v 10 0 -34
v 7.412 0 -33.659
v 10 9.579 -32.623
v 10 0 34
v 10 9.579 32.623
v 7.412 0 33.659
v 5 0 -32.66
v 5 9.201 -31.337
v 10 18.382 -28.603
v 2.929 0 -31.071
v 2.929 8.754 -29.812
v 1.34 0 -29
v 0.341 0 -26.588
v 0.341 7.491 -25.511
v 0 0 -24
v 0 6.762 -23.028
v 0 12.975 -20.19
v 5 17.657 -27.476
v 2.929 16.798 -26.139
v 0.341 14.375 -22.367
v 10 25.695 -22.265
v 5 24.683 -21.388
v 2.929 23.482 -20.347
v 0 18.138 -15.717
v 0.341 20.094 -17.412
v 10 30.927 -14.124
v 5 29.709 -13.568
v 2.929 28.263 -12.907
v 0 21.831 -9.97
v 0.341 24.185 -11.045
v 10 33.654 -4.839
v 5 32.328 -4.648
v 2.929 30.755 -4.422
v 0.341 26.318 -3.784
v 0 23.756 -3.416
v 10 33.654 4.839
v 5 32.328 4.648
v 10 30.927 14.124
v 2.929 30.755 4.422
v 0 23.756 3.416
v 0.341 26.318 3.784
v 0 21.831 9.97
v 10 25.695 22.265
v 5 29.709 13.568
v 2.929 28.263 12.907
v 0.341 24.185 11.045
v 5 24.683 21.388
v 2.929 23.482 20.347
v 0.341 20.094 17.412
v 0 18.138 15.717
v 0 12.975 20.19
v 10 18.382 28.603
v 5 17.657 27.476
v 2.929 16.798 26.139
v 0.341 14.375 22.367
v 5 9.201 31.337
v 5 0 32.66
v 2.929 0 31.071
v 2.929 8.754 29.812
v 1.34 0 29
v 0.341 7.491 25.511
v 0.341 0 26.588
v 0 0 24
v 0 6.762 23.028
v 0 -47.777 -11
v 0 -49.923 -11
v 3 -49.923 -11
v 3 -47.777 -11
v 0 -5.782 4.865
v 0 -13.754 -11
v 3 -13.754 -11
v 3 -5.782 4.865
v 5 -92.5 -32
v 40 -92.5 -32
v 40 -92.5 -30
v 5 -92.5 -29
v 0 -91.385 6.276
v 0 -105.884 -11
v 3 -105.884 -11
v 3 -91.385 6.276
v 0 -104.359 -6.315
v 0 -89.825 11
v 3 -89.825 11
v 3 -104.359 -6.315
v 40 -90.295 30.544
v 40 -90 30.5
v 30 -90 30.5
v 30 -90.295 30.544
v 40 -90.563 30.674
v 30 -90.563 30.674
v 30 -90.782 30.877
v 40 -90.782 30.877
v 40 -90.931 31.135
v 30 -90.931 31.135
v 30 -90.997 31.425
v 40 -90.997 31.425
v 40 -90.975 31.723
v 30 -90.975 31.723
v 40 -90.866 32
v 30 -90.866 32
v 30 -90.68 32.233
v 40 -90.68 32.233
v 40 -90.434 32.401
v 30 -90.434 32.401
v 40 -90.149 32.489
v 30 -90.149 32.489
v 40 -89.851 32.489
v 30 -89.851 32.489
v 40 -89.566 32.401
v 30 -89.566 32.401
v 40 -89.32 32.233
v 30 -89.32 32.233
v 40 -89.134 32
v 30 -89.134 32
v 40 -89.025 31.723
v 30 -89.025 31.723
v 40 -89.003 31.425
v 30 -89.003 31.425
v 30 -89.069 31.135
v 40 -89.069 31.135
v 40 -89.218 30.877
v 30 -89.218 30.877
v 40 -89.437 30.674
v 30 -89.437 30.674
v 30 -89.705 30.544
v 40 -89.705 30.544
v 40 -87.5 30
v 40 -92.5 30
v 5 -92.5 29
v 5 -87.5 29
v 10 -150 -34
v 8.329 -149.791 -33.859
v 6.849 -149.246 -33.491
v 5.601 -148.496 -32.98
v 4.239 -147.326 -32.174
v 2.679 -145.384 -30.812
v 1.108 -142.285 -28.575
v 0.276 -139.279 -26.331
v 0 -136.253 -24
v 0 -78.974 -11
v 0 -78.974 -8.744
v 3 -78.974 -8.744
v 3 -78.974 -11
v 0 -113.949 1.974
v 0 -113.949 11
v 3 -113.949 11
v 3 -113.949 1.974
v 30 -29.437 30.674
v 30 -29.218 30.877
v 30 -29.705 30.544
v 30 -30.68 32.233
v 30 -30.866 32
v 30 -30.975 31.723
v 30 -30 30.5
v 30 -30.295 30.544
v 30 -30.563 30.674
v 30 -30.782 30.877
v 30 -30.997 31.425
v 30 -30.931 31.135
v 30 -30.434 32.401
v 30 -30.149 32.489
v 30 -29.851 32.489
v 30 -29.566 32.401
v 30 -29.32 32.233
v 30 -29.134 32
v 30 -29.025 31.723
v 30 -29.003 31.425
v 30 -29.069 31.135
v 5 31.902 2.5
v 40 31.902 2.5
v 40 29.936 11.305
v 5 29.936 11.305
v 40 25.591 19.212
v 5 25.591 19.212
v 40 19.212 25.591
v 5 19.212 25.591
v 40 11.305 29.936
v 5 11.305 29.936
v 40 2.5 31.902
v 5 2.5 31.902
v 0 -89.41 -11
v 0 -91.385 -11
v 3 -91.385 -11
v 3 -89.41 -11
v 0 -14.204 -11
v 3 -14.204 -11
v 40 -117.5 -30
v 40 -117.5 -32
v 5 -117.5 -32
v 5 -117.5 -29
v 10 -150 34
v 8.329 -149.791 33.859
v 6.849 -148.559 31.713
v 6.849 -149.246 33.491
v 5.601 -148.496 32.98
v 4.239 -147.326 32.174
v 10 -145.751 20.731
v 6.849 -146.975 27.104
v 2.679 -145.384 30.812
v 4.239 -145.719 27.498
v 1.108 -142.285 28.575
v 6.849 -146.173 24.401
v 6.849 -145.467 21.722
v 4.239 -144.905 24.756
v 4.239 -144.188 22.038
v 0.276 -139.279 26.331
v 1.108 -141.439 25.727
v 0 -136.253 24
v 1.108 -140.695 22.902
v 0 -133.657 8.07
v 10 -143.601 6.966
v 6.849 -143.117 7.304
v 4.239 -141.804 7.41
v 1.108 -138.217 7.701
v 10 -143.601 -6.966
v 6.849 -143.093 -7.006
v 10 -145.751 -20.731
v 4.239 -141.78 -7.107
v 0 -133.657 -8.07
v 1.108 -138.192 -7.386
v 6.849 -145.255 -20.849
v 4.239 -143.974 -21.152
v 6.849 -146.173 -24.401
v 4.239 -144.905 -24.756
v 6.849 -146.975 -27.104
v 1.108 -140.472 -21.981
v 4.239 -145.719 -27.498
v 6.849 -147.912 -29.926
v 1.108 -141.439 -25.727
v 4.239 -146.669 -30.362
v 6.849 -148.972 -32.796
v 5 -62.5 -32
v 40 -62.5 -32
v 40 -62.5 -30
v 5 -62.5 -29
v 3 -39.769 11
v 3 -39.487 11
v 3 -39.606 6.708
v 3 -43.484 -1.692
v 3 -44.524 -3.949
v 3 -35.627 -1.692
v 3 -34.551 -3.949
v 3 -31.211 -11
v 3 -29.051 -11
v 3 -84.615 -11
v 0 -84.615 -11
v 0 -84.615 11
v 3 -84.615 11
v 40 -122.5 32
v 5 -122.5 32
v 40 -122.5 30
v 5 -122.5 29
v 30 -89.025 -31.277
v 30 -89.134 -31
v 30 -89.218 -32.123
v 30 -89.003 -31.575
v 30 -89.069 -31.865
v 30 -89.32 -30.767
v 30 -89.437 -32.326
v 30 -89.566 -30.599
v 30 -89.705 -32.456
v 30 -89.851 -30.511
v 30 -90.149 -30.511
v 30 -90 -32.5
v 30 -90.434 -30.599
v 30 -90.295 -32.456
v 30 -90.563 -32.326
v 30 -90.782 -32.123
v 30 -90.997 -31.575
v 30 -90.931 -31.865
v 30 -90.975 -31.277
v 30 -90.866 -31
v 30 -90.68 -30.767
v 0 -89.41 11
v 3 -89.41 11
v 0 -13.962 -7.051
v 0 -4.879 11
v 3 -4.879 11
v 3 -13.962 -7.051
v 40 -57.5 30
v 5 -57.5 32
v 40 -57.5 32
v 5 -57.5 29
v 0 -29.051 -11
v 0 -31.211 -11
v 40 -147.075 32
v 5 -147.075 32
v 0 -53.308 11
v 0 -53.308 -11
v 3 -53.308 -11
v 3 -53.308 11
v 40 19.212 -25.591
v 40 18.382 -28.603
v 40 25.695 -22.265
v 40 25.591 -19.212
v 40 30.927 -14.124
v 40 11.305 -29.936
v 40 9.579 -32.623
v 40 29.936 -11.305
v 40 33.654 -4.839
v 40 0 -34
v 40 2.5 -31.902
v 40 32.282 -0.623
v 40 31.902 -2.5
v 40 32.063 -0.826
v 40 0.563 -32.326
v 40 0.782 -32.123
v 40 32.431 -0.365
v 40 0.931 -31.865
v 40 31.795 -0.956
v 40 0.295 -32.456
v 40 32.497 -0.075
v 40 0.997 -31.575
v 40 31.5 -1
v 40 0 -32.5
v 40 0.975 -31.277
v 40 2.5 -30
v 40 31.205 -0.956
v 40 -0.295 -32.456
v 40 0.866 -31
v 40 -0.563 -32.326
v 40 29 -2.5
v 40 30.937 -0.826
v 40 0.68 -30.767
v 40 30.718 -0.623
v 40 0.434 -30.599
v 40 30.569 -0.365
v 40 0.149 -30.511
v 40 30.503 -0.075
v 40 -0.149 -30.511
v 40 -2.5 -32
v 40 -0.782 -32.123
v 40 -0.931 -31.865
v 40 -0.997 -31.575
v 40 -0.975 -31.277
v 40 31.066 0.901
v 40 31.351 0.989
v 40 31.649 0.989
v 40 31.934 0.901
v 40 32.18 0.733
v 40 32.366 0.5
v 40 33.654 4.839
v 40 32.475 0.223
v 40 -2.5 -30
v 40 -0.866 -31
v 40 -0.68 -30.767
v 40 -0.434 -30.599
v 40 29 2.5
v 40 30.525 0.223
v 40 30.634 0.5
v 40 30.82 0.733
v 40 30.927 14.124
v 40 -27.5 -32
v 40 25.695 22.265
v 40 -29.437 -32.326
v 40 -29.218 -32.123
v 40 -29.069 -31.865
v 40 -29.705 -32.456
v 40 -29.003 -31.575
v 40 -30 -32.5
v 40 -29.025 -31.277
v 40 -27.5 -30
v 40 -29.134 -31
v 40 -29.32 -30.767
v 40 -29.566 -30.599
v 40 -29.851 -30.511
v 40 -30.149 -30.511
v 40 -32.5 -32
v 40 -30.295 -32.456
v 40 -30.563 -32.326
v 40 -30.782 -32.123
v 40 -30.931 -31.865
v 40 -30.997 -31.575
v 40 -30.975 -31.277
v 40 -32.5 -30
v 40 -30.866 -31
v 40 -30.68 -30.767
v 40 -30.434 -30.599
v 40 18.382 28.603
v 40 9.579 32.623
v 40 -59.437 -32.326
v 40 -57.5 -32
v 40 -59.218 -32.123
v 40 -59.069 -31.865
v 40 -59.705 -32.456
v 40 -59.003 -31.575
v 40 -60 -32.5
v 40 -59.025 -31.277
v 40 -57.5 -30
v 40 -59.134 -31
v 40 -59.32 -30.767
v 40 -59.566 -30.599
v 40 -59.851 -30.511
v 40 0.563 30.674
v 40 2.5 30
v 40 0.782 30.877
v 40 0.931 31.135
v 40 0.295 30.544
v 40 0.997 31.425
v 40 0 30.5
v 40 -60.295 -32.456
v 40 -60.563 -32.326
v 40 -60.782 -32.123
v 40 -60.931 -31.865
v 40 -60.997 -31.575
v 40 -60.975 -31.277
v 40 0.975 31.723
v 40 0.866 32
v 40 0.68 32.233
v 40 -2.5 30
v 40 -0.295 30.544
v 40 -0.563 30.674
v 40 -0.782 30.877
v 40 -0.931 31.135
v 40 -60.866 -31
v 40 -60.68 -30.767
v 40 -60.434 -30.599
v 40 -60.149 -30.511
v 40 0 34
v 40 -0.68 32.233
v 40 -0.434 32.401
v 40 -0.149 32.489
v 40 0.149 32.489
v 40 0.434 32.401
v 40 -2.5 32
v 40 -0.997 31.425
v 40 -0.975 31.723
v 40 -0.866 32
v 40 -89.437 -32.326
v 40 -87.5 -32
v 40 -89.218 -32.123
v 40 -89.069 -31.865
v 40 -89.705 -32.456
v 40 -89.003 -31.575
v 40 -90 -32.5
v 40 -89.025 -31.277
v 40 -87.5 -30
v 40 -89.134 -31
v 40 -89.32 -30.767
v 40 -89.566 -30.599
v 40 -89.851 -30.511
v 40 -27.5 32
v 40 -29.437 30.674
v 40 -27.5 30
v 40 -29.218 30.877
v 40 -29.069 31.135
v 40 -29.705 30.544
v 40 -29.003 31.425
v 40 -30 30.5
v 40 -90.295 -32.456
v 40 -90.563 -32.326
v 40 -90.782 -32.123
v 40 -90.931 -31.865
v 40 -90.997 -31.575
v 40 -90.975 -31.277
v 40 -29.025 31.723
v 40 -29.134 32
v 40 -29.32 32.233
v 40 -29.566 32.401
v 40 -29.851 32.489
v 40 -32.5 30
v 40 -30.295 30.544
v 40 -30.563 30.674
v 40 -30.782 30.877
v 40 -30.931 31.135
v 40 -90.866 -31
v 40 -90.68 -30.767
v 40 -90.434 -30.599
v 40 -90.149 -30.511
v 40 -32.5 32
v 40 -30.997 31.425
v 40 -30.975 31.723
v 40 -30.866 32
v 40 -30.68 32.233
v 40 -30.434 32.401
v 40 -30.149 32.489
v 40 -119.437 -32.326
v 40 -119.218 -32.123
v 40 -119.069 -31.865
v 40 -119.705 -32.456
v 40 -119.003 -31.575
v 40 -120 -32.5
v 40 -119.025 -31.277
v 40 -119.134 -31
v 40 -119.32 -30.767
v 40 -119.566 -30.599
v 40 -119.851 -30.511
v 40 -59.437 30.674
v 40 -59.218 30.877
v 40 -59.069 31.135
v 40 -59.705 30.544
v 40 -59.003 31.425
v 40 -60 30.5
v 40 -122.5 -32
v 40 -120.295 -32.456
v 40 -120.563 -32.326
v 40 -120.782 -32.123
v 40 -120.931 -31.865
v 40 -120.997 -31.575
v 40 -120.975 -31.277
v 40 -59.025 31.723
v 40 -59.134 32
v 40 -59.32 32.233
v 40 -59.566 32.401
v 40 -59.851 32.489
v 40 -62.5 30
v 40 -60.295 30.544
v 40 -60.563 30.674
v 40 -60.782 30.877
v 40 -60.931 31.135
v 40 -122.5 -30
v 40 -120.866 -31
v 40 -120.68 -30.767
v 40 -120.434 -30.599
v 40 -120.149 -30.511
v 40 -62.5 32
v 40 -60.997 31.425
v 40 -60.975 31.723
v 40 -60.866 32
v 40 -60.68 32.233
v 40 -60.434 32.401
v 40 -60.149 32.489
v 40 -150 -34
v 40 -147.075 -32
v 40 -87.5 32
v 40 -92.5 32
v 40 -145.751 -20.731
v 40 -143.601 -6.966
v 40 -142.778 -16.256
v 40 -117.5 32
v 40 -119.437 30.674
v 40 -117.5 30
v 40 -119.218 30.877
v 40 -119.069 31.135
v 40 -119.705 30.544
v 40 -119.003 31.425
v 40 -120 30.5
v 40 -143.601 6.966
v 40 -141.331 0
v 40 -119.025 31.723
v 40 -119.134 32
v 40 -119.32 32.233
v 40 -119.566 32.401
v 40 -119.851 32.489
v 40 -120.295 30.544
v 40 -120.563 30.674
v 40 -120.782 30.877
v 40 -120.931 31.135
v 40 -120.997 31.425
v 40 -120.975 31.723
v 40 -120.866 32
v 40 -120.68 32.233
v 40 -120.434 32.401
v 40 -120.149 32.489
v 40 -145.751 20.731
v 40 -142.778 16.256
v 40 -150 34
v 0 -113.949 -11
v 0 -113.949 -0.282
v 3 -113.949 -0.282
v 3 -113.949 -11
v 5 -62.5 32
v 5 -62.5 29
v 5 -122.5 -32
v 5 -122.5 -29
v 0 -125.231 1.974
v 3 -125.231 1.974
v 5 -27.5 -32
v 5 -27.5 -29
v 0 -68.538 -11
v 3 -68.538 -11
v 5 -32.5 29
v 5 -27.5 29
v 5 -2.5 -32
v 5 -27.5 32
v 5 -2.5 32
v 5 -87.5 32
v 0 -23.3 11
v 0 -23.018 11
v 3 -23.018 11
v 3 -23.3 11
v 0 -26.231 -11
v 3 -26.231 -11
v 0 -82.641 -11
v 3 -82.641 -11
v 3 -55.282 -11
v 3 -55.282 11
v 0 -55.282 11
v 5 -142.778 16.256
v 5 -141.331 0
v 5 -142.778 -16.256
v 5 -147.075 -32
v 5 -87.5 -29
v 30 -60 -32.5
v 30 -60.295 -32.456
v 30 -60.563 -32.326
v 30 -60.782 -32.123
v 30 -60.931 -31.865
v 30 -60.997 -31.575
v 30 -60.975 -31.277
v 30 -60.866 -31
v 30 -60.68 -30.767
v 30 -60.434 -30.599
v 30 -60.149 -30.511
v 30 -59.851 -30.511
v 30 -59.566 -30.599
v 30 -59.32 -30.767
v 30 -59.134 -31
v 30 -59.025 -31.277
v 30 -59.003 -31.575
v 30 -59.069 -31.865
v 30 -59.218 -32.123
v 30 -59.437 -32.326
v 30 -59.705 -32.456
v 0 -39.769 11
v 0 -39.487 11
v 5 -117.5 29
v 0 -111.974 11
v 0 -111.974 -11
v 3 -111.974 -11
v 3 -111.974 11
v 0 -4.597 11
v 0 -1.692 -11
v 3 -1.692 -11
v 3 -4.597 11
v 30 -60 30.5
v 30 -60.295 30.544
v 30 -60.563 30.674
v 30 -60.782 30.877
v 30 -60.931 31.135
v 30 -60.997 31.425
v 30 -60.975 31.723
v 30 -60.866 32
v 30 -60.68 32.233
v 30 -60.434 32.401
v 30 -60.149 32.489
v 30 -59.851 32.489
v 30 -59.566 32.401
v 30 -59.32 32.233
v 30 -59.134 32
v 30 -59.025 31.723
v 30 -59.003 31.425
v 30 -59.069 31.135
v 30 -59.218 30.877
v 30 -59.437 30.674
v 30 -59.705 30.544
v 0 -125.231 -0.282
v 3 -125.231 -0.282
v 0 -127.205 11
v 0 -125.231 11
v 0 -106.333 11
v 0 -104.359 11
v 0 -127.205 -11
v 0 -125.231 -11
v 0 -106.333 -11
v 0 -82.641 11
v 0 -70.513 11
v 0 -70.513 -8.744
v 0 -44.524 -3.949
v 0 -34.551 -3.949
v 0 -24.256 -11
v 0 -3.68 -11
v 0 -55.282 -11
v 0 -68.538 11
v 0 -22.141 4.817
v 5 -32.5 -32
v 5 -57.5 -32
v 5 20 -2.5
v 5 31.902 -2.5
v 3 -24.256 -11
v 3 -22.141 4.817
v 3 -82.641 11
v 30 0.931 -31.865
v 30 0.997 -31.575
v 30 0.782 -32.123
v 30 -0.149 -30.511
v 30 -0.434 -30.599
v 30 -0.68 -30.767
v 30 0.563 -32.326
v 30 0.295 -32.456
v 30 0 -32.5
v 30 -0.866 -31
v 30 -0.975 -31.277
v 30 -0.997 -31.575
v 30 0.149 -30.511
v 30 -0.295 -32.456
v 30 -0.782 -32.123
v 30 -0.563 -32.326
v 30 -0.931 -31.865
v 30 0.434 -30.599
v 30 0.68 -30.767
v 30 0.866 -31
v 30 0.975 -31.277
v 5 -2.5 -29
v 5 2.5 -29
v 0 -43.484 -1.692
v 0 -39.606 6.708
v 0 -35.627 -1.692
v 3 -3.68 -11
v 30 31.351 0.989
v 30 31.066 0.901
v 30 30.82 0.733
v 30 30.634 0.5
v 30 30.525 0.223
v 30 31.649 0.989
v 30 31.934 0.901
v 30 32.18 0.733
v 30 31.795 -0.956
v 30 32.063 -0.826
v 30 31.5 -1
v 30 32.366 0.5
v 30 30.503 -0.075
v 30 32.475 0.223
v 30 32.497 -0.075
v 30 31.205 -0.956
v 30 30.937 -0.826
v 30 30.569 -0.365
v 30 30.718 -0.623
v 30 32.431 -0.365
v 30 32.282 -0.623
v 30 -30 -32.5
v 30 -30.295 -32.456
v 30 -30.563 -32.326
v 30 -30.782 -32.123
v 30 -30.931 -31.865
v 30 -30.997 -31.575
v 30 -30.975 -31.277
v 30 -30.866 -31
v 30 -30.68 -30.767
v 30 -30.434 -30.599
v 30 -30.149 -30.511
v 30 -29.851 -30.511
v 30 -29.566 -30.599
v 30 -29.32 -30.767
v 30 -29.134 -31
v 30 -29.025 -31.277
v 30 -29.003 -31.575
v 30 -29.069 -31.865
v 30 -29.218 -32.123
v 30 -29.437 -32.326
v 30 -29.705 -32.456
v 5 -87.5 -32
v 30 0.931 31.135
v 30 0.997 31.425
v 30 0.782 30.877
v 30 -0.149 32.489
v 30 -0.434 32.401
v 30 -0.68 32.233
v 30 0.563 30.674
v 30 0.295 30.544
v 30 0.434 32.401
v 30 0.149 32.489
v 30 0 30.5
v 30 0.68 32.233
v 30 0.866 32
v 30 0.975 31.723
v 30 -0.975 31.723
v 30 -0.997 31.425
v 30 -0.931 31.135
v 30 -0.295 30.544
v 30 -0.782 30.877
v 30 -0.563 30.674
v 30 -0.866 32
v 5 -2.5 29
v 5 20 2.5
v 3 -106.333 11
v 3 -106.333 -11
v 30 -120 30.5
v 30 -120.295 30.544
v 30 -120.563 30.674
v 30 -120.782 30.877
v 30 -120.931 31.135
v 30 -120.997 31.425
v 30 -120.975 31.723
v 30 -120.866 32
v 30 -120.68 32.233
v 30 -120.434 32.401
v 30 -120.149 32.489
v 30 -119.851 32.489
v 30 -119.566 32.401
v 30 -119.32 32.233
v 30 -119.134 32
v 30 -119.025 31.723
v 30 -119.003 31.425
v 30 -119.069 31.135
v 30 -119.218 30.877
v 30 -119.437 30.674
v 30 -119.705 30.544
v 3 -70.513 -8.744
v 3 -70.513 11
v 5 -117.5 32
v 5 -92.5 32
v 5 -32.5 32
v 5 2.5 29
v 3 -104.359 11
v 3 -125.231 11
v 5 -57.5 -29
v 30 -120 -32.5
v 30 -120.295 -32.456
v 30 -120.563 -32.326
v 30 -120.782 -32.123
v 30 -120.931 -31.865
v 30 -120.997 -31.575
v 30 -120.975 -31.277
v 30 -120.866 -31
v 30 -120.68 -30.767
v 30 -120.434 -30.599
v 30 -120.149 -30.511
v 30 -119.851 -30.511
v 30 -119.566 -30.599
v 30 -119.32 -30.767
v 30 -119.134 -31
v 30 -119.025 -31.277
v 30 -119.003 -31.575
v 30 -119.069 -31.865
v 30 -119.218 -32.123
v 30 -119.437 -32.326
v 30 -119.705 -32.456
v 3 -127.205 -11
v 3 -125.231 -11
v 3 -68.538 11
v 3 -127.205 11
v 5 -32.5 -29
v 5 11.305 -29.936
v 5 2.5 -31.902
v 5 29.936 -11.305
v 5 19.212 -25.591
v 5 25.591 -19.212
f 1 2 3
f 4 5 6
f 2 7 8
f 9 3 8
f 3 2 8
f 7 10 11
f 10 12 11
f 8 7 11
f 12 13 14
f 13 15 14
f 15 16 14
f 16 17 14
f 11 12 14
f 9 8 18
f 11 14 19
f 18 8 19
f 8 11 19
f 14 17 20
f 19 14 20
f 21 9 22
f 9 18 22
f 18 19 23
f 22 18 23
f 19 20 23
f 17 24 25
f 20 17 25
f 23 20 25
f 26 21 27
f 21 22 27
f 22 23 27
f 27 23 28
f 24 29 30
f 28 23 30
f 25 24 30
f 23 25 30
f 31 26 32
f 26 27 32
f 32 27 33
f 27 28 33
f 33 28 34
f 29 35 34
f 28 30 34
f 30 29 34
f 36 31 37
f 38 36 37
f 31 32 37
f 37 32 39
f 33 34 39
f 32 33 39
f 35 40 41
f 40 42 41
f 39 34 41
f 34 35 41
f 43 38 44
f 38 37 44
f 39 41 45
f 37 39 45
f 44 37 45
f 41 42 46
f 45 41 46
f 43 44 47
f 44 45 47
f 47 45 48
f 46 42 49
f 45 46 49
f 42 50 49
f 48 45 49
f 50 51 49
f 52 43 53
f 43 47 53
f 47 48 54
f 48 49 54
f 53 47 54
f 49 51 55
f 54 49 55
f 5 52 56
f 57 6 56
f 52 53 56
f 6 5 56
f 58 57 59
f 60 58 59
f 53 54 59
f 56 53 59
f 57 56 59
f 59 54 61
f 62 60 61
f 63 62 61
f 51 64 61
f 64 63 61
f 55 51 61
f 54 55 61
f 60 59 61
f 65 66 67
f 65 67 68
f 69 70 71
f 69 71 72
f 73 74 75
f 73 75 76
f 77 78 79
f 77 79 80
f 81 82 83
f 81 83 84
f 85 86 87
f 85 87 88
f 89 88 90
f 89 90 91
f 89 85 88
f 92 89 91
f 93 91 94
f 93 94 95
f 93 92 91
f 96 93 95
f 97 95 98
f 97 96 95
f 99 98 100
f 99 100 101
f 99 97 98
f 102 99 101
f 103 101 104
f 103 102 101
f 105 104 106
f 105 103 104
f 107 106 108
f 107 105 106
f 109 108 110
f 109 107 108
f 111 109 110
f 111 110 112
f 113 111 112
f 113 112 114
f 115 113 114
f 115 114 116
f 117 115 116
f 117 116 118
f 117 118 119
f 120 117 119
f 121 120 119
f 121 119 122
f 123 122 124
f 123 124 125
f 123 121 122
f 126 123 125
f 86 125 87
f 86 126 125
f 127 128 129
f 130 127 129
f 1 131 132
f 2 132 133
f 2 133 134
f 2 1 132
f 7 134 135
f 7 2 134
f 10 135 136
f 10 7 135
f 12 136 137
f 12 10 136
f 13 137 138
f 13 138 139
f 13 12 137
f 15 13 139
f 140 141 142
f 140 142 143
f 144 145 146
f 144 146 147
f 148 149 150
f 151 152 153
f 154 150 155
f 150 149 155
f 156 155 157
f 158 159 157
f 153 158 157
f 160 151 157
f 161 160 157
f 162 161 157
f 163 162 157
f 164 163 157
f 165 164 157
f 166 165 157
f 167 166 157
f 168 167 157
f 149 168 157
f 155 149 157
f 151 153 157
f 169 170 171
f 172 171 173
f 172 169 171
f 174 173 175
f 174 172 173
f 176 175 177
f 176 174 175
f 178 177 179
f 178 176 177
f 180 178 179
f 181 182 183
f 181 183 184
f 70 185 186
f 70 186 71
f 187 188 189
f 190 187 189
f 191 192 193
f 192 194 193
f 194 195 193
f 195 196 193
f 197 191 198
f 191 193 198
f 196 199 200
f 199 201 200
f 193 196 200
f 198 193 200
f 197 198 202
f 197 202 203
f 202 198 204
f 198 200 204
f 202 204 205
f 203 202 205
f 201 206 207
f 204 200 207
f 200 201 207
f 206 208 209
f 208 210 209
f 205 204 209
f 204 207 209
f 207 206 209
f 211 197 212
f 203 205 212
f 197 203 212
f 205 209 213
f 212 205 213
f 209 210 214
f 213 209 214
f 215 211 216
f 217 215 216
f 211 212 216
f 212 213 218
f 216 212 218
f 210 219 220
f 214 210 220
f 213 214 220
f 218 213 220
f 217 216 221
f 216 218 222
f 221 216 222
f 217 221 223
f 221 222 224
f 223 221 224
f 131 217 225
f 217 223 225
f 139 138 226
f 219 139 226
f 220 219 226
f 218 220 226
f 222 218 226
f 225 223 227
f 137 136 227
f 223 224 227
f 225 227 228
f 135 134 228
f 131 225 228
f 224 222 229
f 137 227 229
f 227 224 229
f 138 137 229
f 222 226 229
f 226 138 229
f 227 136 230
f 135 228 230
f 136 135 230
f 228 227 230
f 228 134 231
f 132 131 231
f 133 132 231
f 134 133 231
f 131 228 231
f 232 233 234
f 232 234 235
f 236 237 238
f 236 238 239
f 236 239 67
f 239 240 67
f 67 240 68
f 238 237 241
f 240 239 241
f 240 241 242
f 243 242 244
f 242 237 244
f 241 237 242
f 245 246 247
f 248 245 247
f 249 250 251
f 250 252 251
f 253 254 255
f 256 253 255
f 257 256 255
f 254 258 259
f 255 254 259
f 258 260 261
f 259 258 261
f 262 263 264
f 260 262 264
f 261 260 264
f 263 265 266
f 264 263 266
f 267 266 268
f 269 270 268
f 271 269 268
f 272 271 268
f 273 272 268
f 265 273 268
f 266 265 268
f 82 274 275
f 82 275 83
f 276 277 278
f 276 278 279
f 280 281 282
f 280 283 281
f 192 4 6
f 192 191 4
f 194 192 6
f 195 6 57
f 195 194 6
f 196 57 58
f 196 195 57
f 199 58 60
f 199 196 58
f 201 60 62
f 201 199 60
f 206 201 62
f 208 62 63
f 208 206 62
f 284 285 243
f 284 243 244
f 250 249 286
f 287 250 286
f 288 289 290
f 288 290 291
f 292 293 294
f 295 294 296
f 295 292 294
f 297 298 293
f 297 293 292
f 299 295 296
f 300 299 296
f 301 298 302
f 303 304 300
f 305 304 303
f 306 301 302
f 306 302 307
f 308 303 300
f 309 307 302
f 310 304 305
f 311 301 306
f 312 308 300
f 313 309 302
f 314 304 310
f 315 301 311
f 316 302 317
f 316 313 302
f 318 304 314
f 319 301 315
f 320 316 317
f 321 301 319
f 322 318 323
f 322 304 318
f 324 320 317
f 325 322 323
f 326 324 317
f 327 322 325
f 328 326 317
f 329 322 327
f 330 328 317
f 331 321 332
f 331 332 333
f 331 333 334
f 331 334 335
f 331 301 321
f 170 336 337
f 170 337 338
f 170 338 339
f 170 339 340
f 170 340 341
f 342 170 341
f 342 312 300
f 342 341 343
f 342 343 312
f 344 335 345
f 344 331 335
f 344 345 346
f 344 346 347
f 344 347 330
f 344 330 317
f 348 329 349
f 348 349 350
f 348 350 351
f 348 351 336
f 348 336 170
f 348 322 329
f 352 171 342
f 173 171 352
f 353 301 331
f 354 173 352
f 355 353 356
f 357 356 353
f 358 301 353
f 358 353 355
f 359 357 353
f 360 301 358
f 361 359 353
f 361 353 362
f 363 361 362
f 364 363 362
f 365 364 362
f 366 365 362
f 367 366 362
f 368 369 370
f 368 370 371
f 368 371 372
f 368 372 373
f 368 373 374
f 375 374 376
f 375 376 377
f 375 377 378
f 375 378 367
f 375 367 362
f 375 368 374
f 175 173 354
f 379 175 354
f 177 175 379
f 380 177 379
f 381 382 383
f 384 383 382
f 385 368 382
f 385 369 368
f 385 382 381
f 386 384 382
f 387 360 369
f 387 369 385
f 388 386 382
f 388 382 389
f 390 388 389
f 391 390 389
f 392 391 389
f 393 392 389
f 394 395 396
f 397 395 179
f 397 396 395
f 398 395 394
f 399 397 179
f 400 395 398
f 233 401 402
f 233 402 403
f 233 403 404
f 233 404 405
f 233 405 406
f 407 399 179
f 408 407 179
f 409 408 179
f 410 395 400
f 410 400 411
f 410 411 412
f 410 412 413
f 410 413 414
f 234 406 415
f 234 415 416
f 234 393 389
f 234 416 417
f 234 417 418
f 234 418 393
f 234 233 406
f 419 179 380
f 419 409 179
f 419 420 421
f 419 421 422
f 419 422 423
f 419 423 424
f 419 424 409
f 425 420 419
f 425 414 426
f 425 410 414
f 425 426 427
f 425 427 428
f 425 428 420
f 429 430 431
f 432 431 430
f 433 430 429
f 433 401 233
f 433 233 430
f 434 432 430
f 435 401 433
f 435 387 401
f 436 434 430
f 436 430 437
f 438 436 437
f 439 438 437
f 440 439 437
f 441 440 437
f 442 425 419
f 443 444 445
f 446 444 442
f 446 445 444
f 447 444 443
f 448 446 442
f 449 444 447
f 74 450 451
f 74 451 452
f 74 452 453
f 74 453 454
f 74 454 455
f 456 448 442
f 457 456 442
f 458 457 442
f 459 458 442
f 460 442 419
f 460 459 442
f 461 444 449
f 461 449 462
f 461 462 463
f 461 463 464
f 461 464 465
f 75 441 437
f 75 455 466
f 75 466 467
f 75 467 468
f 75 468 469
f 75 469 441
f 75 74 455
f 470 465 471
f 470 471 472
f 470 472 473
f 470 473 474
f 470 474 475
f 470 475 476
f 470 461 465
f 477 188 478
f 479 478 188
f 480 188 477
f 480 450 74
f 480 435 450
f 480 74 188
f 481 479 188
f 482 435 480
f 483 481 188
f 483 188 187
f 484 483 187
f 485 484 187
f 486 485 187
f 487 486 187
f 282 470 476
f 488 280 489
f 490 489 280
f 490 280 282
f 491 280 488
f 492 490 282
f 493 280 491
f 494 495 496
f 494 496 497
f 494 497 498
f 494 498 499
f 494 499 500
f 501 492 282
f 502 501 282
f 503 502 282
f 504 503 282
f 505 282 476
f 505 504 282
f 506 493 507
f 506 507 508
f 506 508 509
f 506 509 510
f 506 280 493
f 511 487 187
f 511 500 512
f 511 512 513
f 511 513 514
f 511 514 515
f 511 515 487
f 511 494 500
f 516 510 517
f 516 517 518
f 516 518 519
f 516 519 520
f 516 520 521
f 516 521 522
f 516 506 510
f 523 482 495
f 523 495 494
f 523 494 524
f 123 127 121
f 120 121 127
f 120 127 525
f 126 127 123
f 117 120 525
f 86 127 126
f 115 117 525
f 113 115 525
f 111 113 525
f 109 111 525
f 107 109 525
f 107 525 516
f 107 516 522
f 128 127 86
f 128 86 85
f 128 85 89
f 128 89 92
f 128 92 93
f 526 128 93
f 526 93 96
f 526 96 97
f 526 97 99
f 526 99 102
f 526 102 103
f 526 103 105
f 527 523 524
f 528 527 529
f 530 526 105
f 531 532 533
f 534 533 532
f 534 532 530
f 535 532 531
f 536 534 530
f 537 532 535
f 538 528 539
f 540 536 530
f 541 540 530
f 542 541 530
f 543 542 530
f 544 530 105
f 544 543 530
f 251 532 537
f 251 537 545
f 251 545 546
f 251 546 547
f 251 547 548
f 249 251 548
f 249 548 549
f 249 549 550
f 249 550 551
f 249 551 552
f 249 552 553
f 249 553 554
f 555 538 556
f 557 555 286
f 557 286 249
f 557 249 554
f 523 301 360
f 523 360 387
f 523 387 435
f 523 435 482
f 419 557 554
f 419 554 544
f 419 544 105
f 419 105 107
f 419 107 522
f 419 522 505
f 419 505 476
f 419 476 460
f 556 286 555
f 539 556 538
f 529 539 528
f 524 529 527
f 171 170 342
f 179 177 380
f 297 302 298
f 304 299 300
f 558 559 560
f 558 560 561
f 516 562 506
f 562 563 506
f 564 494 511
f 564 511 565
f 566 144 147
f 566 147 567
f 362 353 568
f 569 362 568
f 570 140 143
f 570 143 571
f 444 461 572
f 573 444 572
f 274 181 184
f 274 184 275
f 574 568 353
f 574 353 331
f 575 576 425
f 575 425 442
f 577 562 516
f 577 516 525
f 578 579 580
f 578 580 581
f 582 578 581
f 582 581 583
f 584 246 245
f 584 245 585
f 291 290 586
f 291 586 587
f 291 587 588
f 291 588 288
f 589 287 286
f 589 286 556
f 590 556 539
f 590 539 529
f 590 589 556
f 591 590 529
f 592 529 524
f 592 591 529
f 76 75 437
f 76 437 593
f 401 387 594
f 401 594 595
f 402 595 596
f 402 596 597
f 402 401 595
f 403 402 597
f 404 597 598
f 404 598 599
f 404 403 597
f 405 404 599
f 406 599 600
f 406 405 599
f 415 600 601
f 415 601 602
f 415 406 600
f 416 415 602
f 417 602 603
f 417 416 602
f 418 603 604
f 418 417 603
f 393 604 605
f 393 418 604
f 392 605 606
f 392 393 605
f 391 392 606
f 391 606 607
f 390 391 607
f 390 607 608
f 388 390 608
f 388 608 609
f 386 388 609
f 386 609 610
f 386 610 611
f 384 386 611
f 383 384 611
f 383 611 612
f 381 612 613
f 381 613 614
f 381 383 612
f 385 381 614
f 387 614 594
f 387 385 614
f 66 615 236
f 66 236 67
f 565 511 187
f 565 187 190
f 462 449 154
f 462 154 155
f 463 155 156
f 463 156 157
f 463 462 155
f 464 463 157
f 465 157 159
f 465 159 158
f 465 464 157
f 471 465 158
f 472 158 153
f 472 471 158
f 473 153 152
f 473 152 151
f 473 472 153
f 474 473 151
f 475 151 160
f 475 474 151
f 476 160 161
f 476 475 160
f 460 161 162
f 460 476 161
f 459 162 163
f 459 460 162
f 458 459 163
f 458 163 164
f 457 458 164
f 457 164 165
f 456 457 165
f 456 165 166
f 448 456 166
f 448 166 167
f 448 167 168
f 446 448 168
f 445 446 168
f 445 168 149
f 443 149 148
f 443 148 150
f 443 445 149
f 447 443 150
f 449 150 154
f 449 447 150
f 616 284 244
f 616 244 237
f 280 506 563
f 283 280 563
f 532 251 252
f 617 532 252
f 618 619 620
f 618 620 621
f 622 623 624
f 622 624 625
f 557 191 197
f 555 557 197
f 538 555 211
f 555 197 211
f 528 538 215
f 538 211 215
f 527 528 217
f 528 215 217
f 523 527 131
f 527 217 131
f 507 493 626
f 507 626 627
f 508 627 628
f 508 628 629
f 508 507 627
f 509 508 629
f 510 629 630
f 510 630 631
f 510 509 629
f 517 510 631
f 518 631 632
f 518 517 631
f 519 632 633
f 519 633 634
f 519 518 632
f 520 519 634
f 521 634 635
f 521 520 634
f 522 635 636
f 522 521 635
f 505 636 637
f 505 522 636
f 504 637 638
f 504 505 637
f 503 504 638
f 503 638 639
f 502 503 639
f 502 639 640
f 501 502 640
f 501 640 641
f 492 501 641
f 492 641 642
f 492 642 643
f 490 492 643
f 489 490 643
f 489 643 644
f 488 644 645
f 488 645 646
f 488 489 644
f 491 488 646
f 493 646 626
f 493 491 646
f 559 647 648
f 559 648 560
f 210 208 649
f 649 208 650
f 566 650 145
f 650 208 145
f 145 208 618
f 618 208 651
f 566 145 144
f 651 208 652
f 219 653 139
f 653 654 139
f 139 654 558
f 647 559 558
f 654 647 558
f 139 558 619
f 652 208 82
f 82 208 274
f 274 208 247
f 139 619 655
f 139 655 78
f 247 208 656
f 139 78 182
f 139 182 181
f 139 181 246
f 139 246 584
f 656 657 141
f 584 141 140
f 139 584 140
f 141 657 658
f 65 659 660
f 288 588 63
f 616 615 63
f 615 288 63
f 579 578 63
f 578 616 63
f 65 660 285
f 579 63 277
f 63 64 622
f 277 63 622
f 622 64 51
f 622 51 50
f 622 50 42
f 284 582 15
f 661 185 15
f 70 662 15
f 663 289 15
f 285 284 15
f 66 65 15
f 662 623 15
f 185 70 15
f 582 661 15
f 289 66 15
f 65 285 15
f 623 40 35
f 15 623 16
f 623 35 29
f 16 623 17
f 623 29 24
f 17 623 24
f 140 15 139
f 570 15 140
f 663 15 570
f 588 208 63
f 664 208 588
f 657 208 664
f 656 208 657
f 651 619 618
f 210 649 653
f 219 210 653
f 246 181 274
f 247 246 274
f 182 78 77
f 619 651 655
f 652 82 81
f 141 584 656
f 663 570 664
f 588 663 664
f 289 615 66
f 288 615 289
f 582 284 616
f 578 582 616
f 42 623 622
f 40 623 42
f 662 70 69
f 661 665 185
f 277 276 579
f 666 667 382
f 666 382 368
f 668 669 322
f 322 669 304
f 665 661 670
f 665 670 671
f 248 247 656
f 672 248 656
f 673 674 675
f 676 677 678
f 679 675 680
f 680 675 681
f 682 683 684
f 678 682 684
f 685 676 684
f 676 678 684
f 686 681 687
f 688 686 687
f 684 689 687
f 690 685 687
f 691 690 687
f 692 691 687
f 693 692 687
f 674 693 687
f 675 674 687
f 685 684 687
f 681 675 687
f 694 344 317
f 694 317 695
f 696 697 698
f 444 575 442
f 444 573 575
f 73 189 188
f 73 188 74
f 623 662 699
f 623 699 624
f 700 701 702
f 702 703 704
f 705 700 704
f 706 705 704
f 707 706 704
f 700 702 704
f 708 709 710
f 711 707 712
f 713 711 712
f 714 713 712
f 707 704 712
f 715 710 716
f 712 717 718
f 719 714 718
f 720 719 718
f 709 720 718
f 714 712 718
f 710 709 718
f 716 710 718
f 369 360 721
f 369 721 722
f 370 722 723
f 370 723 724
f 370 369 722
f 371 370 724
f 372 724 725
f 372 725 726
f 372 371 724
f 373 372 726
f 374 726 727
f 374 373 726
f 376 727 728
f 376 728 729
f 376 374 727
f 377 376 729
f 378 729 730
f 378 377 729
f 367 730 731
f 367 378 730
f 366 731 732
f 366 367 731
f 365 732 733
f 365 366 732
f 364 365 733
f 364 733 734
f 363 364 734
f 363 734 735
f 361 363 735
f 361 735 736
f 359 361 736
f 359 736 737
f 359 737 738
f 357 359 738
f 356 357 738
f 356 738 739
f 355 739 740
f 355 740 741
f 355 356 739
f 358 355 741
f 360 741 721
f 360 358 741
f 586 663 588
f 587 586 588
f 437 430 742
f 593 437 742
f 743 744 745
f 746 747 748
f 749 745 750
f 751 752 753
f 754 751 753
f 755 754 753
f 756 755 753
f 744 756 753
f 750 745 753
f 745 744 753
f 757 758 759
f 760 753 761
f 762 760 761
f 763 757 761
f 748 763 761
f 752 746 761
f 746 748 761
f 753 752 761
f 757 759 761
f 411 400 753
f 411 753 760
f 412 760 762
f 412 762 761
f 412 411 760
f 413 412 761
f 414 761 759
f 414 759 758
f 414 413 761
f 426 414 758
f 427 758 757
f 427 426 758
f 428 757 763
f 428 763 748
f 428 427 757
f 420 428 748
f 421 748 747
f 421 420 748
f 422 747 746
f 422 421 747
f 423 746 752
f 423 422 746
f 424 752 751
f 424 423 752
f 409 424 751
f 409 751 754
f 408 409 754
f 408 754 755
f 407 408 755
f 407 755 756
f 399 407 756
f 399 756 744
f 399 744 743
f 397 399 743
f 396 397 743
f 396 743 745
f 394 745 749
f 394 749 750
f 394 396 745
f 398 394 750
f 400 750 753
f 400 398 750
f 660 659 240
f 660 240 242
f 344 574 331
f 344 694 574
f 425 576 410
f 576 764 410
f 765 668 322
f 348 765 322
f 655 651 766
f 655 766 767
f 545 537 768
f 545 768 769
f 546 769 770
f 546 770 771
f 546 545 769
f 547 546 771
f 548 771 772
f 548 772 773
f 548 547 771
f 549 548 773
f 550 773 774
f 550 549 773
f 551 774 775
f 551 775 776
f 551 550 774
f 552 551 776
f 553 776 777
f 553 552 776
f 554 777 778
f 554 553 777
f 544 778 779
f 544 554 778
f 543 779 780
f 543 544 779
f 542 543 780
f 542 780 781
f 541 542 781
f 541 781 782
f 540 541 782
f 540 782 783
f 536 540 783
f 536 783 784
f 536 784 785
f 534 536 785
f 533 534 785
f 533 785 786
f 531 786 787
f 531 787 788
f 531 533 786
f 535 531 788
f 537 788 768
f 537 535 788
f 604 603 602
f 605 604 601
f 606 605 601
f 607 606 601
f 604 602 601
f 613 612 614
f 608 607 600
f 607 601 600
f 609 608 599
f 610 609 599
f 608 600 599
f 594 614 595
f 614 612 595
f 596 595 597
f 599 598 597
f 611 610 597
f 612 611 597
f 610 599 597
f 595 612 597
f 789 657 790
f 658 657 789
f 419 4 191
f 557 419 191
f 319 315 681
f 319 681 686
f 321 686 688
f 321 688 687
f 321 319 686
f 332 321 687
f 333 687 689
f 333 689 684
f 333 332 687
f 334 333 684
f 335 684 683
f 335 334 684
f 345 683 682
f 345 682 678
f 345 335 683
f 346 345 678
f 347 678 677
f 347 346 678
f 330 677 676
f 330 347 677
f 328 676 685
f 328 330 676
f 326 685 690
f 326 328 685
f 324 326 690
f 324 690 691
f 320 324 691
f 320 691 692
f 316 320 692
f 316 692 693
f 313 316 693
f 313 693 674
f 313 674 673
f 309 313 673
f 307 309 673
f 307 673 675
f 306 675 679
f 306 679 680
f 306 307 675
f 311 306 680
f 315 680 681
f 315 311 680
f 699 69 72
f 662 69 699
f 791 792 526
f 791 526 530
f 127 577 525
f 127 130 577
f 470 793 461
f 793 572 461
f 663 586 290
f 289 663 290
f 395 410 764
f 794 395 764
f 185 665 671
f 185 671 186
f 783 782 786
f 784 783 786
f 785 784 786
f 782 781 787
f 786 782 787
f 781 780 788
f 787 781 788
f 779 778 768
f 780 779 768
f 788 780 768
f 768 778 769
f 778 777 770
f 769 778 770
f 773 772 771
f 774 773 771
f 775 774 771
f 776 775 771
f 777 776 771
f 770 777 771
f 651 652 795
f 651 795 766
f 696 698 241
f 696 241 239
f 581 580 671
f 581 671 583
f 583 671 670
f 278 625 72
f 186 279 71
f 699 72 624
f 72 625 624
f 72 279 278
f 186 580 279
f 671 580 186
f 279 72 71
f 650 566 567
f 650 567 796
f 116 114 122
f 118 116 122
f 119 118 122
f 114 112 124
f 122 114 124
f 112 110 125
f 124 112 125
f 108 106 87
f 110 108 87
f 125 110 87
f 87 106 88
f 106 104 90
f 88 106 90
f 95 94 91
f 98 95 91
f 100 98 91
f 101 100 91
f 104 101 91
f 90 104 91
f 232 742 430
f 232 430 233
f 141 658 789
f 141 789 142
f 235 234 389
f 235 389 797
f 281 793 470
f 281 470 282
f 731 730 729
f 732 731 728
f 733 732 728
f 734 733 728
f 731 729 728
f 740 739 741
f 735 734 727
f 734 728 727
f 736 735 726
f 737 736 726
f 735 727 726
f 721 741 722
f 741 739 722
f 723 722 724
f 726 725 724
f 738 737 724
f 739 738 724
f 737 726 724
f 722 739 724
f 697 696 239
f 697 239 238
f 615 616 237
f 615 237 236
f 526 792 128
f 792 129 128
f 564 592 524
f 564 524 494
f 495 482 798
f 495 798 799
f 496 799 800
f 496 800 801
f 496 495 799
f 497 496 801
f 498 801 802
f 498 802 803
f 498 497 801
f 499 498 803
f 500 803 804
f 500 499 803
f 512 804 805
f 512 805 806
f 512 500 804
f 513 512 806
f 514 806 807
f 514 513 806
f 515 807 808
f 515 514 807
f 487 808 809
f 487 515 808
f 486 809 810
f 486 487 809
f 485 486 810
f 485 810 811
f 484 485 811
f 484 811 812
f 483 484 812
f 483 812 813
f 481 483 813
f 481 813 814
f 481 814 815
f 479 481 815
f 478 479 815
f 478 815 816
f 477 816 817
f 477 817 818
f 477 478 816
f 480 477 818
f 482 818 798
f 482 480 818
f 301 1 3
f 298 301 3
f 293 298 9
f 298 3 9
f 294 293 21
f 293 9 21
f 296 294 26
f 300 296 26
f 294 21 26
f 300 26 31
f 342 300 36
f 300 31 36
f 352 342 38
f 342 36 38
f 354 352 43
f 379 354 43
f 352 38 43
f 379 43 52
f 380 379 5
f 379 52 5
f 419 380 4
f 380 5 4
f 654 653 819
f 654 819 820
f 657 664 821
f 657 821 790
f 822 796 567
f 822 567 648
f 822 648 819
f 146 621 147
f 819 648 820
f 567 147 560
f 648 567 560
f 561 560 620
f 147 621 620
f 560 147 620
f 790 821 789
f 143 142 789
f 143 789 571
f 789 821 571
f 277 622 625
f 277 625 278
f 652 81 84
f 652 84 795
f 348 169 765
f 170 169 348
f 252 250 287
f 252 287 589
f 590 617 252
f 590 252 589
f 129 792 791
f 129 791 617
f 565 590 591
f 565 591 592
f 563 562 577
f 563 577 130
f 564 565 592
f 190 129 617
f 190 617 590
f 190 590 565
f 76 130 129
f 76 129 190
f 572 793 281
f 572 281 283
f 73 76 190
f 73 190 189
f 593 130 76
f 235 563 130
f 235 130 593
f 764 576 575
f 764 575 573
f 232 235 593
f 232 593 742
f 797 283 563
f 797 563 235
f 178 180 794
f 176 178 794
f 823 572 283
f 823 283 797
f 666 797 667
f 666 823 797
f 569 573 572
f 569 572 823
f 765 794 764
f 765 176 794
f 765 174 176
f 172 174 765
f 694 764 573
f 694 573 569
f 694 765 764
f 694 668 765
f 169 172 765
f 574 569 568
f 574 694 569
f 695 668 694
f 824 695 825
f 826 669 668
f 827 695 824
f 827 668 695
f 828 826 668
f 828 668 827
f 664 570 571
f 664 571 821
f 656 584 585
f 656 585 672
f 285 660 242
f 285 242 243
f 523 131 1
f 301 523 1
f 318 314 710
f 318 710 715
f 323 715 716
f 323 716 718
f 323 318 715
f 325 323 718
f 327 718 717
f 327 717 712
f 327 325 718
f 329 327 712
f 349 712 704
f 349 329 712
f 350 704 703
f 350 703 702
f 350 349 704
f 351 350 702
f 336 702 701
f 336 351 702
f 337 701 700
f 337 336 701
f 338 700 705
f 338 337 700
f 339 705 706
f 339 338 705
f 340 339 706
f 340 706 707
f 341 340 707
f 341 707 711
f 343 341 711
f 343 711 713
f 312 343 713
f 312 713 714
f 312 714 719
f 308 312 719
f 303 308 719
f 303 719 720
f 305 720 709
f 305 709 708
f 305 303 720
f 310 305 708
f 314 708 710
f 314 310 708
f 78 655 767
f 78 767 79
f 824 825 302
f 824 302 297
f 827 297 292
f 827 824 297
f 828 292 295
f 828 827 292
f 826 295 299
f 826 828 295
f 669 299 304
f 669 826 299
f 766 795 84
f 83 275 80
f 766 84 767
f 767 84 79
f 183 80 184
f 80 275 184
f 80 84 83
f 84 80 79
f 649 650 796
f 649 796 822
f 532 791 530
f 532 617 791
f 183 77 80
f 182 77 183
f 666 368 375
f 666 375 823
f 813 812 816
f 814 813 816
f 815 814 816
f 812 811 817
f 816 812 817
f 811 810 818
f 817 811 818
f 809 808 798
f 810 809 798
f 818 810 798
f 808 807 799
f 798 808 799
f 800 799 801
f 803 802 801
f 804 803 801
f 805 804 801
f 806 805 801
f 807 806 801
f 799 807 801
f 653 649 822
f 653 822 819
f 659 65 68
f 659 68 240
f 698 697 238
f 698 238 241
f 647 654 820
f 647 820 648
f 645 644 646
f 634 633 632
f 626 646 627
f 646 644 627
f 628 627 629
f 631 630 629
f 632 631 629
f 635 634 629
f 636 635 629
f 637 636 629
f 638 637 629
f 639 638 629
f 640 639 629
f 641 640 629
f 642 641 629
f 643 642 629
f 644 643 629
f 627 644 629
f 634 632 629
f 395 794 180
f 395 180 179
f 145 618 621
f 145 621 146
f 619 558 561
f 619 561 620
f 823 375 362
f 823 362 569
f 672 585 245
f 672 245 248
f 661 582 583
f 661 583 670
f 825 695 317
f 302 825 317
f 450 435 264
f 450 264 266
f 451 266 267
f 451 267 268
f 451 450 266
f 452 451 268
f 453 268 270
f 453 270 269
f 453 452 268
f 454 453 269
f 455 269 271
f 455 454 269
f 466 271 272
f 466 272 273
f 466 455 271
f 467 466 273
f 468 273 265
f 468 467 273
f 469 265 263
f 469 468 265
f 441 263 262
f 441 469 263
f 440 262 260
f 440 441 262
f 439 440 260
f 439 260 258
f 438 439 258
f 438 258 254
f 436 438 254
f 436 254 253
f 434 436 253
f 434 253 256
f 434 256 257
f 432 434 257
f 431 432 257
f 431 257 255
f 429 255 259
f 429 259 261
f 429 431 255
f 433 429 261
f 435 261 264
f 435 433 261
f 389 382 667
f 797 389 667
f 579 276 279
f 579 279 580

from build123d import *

# Parameters (mm, degrees)
BOSS_EXTRUDE3_DEPTH  = 5
EXTRUDE_THIN3_DEPTH  = 35
RIB3_START           = -2.5
RIB3_DEPTH           = 5
RIB13_START          = -2.5
RIB13_DEPTH          = 5
LPATTERN1_COUNT      = 5
LPATTERN1_PITCH      = 30
MIRROR1_START        = -2.5
MIRROR1_COPY_1_DEPTH = 5
MIRROR1_COPY_2_DEPTH = 5
MIRROR1_COPY_3_DEPTH = 5
MIRROR1_COPY_4_DEPTH = 5
CUT_EXTRUDE1_START   = -40
SKETCH11_R           = 1
CUT_EXTRUDE1_DEPTH   = 10
FILLET2_R            = 10
SKETCH12_W           = 22
SKETCH12_H           = 1.974358974
CUT_EXTRUDE2_DEPTH   = 3


# Read off the part's stored shape, not the designer's step: Rib3, Rib13
with BuildPart() as part:
    # Sketch7 → Boss-Extrude3 (new body)
    with BuildSketch(Plane(origin=(0, 0, 0), x_dir=(0, 0, -1), z_dir=(1, 0, 0))):
        with BuildLine():
            Line((-34, 0), (-34, -150))
            ThreePointArc((-34, -150), (0, -143.330666624), (34, -150))
            Line((34, -150), (34, 0))
            ThreePointArc((34, 0), (0, 34), (-34, 0))
        make_face()
    extrude(amount=BOSS_EXTRUDE3_DEPTH)

    # Sketch10 → Extrude-Thin3 (add)
    with BuildSketch(Plane(origin=(5, 0, 0), x_dir=(0, 0, -1), z_dir=(1, 0, 0))):
        with BuildLine():
            Line((34, -150), (34, 0))
            ThreePointArc((34, 0), (0, 34), (-34, 0))
            Line((-34, 0), (-34, -150))
            ThreePointArc((-34, -150), (0, -143.330666624), (34, -150))
        make_face()
        with BuildLine():
            Line((32, -147.075232013), (32, 0))
            ThreePointArc((32, 0), (0, 32), (-32, 0))
            Line((-32, 0), (-32, -147.075232013))
            ThreePointArc((-32, -147.075232013), (0, -141.330666624), (32, -147.075232013))
        make_face(mode=Mode.SUBTRACT)
    extrude(amount=EXTRUDE_THIN3_DEPTH)

    # Rib3 outline → Rib3 (add)
    with BuildSketch(Plane.XY.offset(RIB3_START)):
        Polygon((5, 20), (40, 29), (40, 33), (4, 33), (4, 19.742857143), align=None)
    extrude(amount=RIB3_DEPTH)

    # Rib13 outline → Rib13 (add)
    with BuildSketch(Plane(origin=(0, 0, 0), x_dir=(1, 0, 0), z_dir=(0, 1, 0)).offset(RIB13_START)):
        Polygon((5, -32), (40, -32), (40, -30), (5, -29), align=None)
    rib13 = extrude(amount=RIB13_DEPTH)

    # LPattern1: Rib13 ×5
    with Locations(*[(0, -i * LPATTERN1_PITCH, 0) for i in range(1, LPATTERN1_COUNT)]):
        add(rib13)

    # Mirror1: Rib13 across plane
    add(rib13.mirror(Plane.XY))

    # Mirror1 copy 1 sketch → Mirror1 copy 1 (add)
    with BuildSketch(Plane(origin=(0, -30, 0), x_dir=(1, 0, 0), z_dir=(0, 1, 0)).offset(MIRROR1_START)):
        Polygon((5, 32), (40, 32), (40, 30), (5, 29), align=None)
    extrude(amount=MIRROR1_COPY_1_DEPTH)

    # Mirror1 copy 2 sketch → Mirror1 copy 2 (add)
    with BuildSketch(Plane(origin=(0, -60, 0), x_dir=(1, 0, 0), z_dir=(0, 1, 0)).offset(MIRROR1_START)):
        Polygon((5, 32), (40, 32), (40, 30), (5, 29), align=None)
    extrude(amount=MIRROR1_COPY_2_DEPTH)

    # Mirror1 copy 3 sketch → Mirror1 copy 3 (add)
    with BuildSketch(Plane(origin=(0, -90, 0), x_dir=(1, 0, 0), z_dir=(0, 1, 0)).offset(MIRROR1_START)):
        Polygon((5, 32), (40, 32), (40, 30), (5, 29), align=None)
    extrude(amount=MIRROR1_COPY_3_DEPTH)

    # Mirror1 copy 4 sketch → Mirror1 copy 4 (add)
    with BuildSketch(Plane(origin=(0, -120, 0), x_dir=(1, 0, 0), z_dir=(0, 1, 0)).offset(MIRROR1_START)):
        Polygon((5, 32), (40, 32), (40, 30), (5, 29), align=None)
    extrude(amount=MIRROR1_COPY_4_DEPTH)

    # Sketch11 → Cut-Extrude1 (cut)
    with BuildSketch(Plane.ZY.offset(CUT_EXTRUDE1_START)):
        with Locations(Location((-31.5, 0, 0), (0, 0, 180))):
            Circle(SKETCH11_R)
        with Locations(Location((31.5, 0, 0), (0, 0, 180))):
            Circle(SKETCH11_R)
        with Locations(Location((-31.5, -30, 0), (0, 0, 180))):
            Circle(SKETCH11_R)
        with Locations(Location((31.5, -30, 0), (0, 0, 180))):
            Circle(SKETCH11_R)
        with Locations(Location((-31.5, -60, 0), (0, 0, 180))):
            Circle(SKETCH11_R)
        with Locations(Location((31.5, -60, 0), (0, 0, 180))):
            Circle(SKETCH11_R)
        with Locations(Location((-31.5, -90, 0), (0, 0, 180))):
            Circle(SKETCH11_R)
        with Locations(Location((31.5, -90, 0), (0, 0, 180))):
            Circle(SKETCH11_R)
        with Locations(Location((-31.5, -120, 0), (0, 0, 180))):
            Circle(SKETCH11_R)
        with Locations(Location((31.5, -120, 0), (0, 0, 180))):
            Circle(SKETCH11_R)
        with Locations(Location((0, 31.5, 0), (0, 0, 180))):
            Circle(SKETCH11_R)
    extrude(amount=CUT_EXTRUDE1_DEPTH, mode=Mode.SUBTRACT)

    # Fillet2
    fillet2_edges = [part.edges().sort_by_distance(p)[0] for p in [
        (0, -75, -34),
        (0, -143.330666624, 0),
        (0, -75, 34),
        (0, 34, 0),
    ]]
    fillet(fillet2_edges, radius=FILLET2_R)

    # Sketch12 → Cut-Extrude2 (cut)
    # profile 1 of 7: a face of its own
    with BuildSketch(Plane.ZY):
        Polygon((-11, -1.692307692), (11, -4.596554487), (11, -4.878605769), (-7.051282051, -13.961538462), (11, -23.018028846), (11, -23.300080128), (-11, -26.230769231), (-11, -24.256410256), (4.816907051, -22.141025641), (-11, -14.203926282), (-11, -13.754407051), (4.865384615, -5.782051282), (-11, -3.679887821), align=None)
    # profile 2 of 7: a face of its own
    with BuildSketch(Plane.ZY):
        Polygon((11, -39.769230769), (-11, -49.923076923), (-11, -47.776842949), (-3.948717949, -44.524439103), (-3.948717949, -34.551282051), (-11, -31.210737179), (-11, -29.051282051), (11, -39.487179487), align=None)
        Polygon((6.707532051, -39.606169872), (-1.692307692, -35.626602564), (-1.692307692, -43.484375), align=None, mode=Mode.SUBTRACT)
    # profile 3 of 7: a face of its own
    with BuildSketch(Plane.ZY):
        with Locations((0, -54.294871795)):
            Rectangle(SKETCH12_W, SKETCH12_H)
    # profile 4 of 7: a face of its own
    with BuildSketch(Plane.ZY):
        Polygon((11, -68.538461538), (11, -70.512820513), (-8.743589744, -70.512820513), (-8.743589744, -78.974358974), (-11, -78.974358974), (-11, -68.538461538), align=None)
    # profile 5 of 7: a face of its own
    with BuildSketch(Plane.ZY):
        with Locations((0, -83.628205128)):
            Rectangle(SKETCH12_W, SKETCH12_H)
    # profile 6 of 7: a face of its own
    with BuildSketch(Plane.ZY):
        Polygon((-11, -89.41025641), (11, -89.41025641), (11, -89.824519231), (-6.315304487, -104.358974359), (11, -104.358974359), (11, -106.333333333), (-11, -106.333333333), (-11, -105.883814103), (6.275641026, -91.384615385), (-11, -91.384615385), align=None)
    # profile 7 of 7: a face of its own
    with BuildSketch(Plane.ZY):
        Polygon((11, -111.974358974), (11, -113.948717949), (1.974358974, -113.948717949), (1.974358974, -125.230769231), (11, -125.230769231), (11, -127.205128205), (-11, -127.205128205), (-11, -125.230769231), (-0.282051282, -125.230769231), (-0.282051282, -113.948717949), (-11, -113.948717949), (-11, -111.974358974), align=None)
    extrude(amount=-CUT_EXTRUDE2_DEPTH, mode=Mode.SUBTRACT)


solid = part.part
